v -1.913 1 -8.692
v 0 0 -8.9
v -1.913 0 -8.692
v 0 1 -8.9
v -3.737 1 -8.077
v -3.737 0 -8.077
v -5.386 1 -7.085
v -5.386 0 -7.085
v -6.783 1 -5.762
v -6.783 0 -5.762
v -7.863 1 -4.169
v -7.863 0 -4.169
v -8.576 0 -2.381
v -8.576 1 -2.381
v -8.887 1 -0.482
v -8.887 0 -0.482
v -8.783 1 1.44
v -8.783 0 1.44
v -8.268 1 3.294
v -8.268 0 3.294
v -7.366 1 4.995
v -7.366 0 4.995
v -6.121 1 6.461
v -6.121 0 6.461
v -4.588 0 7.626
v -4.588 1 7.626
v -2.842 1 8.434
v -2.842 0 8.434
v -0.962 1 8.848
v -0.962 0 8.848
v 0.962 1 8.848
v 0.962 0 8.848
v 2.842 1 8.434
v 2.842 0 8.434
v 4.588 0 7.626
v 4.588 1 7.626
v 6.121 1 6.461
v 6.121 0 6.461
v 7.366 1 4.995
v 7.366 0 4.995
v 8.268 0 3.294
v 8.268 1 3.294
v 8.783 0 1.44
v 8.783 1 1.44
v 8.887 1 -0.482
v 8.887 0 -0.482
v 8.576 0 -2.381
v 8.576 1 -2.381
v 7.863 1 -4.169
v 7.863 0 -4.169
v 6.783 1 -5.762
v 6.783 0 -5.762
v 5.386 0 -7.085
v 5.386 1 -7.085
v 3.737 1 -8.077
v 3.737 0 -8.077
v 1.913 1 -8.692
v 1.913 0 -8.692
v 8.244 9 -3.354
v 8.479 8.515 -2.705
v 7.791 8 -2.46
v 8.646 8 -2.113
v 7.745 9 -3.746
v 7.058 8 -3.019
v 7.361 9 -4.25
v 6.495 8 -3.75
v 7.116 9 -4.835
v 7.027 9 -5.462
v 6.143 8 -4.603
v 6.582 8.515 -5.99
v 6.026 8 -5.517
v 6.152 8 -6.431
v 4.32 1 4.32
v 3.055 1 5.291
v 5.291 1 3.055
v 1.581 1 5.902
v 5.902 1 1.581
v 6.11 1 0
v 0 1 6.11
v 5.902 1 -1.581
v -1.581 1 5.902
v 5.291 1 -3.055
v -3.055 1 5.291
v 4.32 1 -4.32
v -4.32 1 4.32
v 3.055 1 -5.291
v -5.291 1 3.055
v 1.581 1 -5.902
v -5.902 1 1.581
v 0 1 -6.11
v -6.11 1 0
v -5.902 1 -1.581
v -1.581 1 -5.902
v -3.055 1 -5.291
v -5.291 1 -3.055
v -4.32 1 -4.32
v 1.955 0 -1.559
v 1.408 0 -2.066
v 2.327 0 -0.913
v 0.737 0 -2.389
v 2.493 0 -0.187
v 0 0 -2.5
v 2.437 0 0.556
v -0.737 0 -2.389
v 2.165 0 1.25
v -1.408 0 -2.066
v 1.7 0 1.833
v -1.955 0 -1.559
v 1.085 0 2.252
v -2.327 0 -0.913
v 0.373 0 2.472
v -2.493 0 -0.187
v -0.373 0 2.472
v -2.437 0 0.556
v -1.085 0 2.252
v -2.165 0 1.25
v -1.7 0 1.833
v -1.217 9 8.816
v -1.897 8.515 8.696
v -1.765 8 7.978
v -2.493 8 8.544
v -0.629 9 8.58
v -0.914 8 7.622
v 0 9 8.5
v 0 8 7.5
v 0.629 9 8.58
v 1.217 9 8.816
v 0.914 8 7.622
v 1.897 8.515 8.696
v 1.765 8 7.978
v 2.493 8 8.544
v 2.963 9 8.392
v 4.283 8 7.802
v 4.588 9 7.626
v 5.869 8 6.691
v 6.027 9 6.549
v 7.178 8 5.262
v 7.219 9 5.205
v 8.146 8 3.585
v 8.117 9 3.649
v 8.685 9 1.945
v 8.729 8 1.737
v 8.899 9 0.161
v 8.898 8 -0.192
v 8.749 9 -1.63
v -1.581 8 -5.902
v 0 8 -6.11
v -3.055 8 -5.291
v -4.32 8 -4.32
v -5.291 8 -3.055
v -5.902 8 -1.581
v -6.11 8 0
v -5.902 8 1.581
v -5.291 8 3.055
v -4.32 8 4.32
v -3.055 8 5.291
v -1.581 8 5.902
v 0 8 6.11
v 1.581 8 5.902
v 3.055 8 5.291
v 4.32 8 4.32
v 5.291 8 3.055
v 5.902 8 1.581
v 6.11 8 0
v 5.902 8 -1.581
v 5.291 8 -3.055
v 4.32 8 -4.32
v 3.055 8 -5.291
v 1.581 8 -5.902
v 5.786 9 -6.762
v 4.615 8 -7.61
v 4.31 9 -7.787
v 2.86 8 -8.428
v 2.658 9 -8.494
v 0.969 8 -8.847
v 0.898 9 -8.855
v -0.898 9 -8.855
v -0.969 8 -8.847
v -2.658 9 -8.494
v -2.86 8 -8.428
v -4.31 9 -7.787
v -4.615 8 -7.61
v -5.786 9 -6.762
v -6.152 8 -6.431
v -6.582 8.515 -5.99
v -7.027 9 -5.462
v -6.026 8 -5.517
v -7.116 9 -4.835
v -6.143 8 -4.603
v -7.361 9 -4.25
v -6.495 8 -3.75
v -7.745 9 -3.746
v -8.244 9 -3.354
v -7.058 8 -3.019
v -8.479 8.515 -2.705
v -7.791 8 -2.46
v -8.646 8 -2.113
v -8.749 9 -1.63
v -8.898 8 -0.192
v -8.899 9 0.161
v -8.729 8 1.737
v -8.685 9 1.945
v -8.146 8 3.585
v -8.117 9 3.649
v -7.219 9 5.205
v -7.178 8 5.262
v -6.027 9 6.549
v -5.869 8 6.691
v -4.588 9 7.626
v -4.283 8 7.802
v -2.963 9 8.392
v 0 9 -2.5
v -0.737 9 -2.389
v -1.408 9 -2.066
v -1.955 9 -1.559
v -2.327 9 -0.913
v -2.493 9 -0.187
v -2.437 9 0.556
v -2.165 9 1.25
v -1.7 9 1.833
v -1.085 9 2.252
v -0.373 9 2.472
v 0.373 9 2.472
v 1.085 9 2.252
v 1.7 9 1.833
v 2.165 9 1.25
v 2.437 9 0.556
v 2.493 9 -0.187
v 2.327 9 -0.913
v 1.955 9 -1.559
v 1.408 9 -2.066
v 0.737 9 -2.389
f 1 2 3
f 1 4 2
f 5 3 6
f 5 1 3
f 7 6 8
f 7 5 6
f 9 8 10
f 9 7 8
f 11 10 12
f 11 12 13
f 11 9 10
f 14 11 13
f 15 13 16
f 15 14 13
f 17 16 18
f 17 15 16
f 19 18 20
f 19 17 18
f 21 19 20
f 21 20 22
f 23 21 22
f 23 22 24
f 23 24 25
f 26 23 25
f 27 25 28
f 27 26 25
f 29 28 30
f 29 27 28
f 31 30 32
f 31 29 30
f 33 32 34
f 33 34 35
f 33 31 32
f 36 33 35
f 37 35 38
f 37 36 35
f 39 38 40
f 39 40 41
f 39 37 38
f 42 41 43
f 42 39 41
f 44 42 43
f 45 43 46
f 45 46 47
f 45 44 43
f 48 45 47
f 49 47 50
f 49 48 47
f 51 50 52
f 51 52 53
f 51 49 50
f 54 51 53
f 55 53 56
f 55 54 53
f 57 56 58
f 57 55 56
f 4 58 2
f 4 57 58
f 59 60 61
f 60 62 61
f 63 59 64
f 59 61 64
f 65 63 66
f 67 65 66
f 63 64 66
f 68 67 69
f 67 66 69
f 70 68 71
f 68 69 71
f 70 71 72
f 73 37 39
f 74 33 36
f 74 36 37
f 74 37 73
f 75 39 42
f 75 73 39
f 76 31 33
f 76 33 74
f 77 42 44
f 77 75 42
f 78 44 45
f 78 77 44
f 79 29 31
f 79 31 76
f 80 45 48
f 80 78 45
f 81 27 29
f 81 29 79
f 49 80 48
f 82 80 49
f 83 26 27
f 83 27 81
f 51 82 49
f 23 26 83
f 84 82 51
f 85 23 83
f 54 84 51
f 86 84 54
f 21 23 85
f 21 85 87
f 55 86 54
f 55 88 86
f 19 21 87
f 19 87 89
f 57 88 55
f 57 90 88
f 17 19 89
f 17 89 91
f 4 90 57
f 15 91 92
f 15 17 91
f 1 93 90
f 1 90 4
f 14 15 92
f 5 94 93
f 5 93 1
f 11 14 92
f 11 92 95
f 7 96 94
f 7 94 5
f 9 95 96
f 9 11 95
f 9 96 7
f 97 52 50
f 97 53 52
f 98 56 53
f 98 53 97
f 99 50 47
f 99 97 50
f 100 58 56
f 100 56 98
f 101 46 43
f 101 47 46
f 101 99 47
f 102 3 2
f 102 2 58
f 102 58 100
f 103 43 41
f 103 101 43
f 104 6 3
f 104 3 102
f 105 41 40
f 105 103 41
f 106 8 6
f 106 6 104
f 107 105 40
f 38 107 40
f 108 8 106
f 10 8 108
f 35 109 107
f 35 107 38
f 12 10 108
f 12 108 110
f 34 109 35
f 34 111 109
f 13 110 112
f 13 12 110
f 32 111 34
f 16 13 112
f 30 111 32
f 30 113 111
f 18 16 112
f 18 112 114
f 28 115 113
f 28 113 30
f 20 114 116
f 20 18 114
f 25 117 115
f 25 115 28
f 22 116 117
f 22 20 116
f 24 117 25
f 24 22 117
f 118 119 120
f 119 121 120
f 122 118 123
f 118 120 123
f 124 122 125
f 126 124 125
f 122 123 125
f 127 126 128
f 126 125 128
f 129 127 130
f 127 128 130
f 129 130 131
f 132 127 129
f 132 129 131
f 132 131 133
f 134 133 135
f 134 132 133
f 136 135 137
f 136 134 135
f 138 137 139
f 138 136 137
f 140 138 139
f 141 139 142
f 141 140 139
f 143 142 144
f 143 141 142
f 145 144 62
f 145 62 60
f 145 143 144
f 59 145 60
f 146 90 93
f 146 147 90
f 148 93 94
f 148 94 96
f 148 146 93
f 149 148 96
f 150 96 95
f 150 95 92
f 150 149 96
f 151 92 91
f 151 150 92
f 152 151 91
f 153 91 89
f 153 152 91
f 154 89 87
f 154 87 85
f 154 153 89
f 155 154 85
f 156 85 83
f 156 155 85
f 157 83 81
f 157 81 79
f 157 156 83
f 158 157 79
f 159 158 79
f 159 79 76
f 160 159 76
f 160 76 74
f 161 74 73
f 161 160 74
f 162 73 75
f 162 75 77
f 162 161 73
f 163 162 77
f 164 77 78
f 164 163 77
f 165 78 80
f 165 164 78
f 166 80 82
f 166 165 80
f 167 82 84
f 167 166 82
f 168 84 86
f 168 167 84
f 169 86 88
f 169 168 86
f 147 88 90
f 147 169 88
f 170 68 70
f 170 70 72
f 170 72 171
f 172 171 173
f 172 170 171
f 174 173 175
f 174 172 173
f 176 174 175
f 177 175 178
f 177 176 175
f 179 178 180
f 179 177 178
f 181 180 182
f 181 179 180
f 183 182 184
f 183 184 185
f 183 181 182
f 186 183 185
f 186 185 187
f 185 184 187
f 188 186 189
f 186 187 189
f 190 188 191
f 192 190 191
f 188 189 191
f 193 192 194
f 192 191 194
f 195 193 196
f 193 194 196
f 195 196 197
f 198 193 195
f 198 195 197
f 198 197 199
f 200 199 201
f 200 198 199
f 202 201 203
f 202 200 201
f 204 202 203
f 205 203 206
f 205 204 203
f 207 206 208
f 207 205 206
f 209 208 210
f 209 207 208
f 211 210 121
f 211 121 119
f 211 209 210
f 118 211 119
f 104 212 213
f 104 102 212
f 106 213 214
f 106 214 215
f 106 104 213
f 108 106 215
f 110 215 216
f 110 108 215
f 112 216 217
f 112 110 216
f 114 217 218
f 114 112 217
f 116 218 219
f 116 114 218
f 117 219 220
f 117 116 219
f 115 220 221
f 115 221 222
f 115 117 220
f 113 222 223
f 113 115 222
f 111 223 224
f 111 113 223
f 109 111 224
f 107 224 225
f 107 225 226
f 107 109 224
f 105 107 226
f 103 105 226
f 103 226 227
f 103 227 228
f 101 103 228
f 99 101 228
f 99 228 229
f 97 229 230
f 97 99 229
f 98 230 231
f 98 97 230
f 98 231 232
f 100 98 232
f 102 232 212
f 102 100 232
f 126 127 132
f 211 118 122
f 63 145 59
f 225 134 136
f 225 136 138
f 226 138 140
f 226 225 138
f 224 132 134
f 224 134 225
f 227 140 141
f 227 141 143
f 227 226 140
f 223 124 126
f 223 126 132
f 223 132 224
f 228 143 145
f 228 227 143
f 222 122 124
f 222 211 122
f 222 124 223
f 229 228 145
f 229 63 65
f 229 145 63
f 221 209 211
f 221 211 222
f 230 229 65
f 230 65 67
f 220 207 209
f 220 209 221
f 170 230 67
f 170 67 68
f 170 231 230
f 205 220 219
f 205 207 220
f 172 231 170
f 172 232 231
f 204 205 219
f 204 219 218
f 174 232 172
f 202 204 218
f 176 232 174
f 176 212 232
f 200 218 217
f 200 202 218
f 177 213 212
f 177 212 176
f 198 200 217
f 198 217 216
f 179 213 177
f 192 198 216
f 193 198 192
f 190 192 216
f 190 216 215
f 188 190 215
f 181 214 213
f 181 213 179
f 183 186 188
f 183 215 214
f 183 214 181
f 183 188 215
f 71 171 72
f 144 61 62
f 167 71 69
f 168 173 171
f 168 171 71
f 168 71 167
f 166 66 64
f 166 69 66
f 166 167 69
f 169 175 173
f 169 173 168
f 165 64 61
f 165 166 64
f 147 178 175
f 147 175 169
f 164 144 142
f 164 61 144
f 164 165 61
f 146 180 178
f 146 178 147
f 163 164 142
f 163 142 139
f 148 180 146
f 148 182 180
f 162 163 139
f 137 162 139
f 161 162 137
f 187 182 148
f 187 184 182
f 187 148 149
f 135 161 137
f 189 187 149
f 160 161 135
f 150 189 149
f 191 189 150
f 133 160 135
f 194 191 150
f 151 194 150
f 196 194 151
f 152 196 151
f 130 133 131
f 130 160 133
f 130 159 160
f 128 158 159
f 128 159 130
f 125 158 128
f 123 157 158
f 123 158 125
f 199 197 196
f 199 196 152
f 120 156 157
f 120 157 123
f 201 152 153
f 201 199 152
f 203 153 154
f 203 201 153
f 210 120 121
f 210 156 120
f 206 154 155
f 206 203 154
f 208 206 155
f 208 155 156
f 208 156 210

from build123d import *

# Parameters (mm, degrees)
ENL_V_MAT_EXTRU_1_REACH = 16.914
ESQUISSE2_R             = 2.5
CHANFREIN1_SIZE         = 1


with BuildPart() as part:
    # Esquisse1 → Révolution1 (revolve)
    with BuildSketch(Plane.XY, mode=Mode.PRIVATE) as r_volution1_sk:
        Polygon((2.5, 0), (8.9, 0), (8.9, 1), (6.11, 1), (6.11, 8), (8.9, 8), (8.9, 9), (2.5, 9), align=None)
    revolve(r_volution1_sk.sketch.rotate(Axis((0, 0, 0), (0, 1, 0)), 90), axis=Axis((0, 0, 0), (0, 1, 0)))

    # Esquisse2 → Enlèv. mat.-Extru.1 (cut, up to next)
    with BuildSketch(Plane.XZ.offset(-8), mode=Mode.PRIVATE) as enl_v_mat_extru_1_sk1:
        with Locations((0, 11)):
            Circle(ESQUISSE2_R)
    enl_v_mat_extru_1_tool1 = extrude(enl_v_mat_extru_1_sk1.sketch, amount=-ENL_V_MAT_EXTRU_1_REACH, mode=Mode.PRIVATE) & part.part
    # Esquisse2 → Enlèv. mat.-Extru.1 (cut, up to next)
    with BuildSketch(Plane.XZ.offset(-8), mode=Mode.PRIVATE) as enl_v_mat_extru_1_sk2:
        with Locations((9.526279442, -5.5)):
            Circle(ESQUISSE2_R)
    enl_v_mat_extru_1_tool2 = extrude(enl_v_mat_extru_1_sk2.sketch, amount=-ENL_V_MAT_EXTRU_1_REACH, mode=Mode.PRIVATE) & part.part
    # Esquisse2 → Enlèv. mat.-Extru.1 (cut, up to next)
    with BuildSketch(Plane.XZ.offset(-8), mode=Mode.PRIVATE) as enl_v_mat_extru_1_sk3:
        with Locations((-9.526279442, -5.5)):
            Circle(ESQUISSE2_R)
    enl_v_mat_extru_1_tool3 = extrude(enl_v_mat_extru_1_sk3.sketch, amount=-ENL_V_MAT_EXTRU_1_REACH, mode=Mode.PRIVATE) & part.part
    add(enl_v_mat_extru_1_tool1.solids().sort_by_distance((0, 8, 11))[0], mode=Mode.SUBTRACT)
    add(enl_v_mat_extru_1_tool2.solids().sort_by_distance((9.526279, 8, -5.5))[0], mode=Mode.SUBTRACT)
    add(enl_v_mat_extru_1_tool3.solids().sort_by_distance((-9.526279, 8, -5.5))[0], mode=Mode.SUBTRACT)

    # Chanfrein1
    chanfrein1_edges = [part.edges().sort_by_distance(p)[0] for p in [
        (7.361215932, 8, -4.25),
        (0, 8, 8.5),
        (-7.361215932, 8, -4.25),
    ]]
    chamfer(chanfrein1_edges, length=CHANFREIN1_SIZE - 0.0001)  # a hair under: the kernel refuses the full size


solid = part.part
